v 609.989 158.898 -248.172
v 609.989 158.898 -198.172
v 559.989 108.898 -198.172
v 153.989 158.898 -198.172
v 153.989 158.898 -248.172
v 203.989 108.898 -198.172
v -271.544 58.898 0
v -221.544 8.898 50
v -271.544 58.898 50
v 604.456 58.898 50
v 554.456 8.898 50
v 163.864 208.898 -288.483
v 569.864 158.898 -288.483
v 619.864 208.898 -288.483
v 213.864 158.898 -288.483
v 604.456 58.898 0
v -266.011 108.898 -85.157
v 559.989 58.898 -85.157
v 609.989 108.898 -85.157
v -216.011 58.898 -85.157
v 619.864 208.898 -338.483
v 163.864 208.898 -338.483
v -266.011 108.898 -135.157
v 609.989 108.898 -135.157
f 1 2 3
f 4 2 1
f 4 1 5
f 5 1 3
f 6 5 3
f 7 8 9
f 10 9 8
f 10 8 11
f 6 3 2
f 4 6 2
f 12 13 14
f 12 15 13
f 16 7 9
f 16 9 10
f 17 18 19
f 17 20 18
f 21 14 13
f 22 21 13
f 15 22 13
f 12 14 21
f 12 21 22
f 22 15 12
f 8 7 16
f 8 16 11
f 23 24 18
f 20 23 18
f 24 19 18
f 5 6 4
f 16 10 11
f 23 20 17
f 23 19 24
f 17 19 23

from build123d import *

# Parameters (mm, degrees)
F0_W      = 876
F0_H      = 50
F1_DEPTH  = 50
F3_DEPTH  = 876.001
F4_W      = 876
F4_H      = 50
F5_DEPTH  = 50
F7_DEPTH  = 876
F8_W      = 456
F8_H      = 50
F9_DEPTH  = 50
F11_DEPTH = 876
F12_W     = 456
F12_H     = 50
F13_DEPTH = 50
F15_DEPTH = 456
F17_DEPTH = 388.483529
F19_DEPTH = 253.326912
F21_DEPTH = 140.311034
F23_DEPTH = 50


with BuildPart() as f1:
    # F0 (on Top) → F1 (new body)
    with BuildSketch(Plane.XY):
        with Locations((166.456298, 33.898029)):
            Rectangle(F0_W, F0_H)
    extrude(amount=F1_DEPTH)

    # F2 (on face) → F3 (cut, through all)
    with BuildSketch(Plane.YZ.offset(604.456298)):
        Polygon((58.898029, 0), (8.898029, 50), (8.898029, 0), align=None)
    extrude(amount=-F3_DEPTH, mode=Mode.SUBTRACT)

    # F16 (on face) → F17 (cut, through all)
    with BuildSketch(Plane.XY.offset(50)):
        Polygon((-221.543702, 8.898029), (-271.543702, 58.898029), (-271.543702, 8.898029), align=None)
        Polygon((604.456298, 8.898029), (604.456298, 58.898029), (554.456298, 8.898029), align=None)
    extrude(amount=-F17_DEPTH, mode=Mode.SUBTRACT)


with BuildPart() as f5:
    # F4 (on face) → F5 (new body)
    with BuildSketch(Plane(origin=(0, 58.898029, 0), x_dir=(-1, 0, 0), z_dir=(0, 1, 0))):
        with Locations((-171.989239, -110.156617)):
            Rectangle(F4_W, F4_H)
    extrude(amount=F5_DEPTH)

    # F6 (on face) → F7 (cut)
    with BuildSketch(Plane.YZ.offset(609.989239)):
        Polygon((108.898029, -135.156617), (58.898029, -85.156617), (58.898029, -135.156617), align=None)
    extrude(amount=-F7_DEPTH, mode=Mode.SUBTRACT)

    # F18 (on face) → F19 (cut, through all)
    with BuildSketch(Plane.XY.offset(-85.156617)):
        Polygon((-216.010761, 58.898029), (-266.010761, 108.898029), (-266.010761, 58.898029), align=None)
        Polygon((609.989239, 58.898029), (609.989239, 108.898029), (559.989239, 58.898029), align=None)
    extrude(amount=-F19_DEPTH, mode=Mode.SUBTRACT)


with BuildPart() as f9:
    # F8 (on face) → F9 (new body)
    with BuildSketch(Plane(origin=(0, 108.898029, 0), x_dir=(-1, 0, 0), z_dir=(0, 1, 0))):
        with Locations((-381.989239, -223.172495)):
            Rectangle(F8_W, F8_H)
    extrude(amount=F9_DEPTH)

    # F10 (on face) → F11 (cut)
    with BuildSketch(Plane.YZ.offset(609.989239)):
        Polygon((158.898029, -248.172495), (108.898029, -198.172495), (108.898029, -248.172495), align=None)
    extrude(amount=-F11_DEPTH, mode=Mode.SUBTRACT)

    # F20 (on face) → F21 (cut, through all)
    with BuildSketch(Plane.XY.offset(-198.172495)):
        Polygon((203.989239, 108.898029), (153.989239, 158.898029), (153.989239, 108.898029), align=None)
        Polygon((609.989239, 108.898029), (609.989239, 158.898029), (559.989239, 108.898029), align=None)
    extrude(amount=-F21_DEPTH, mode=Mode.SUBTRACT)


with BuildPart() as f13:
    # F12 (on face) → F13 (new body)
    with BuildSketch(Plane(origin=(0, 158.898029, 0), x_dir=(-1, 0, 0), z_dir=(0, 1, 0))):
        with Locations((-391.864389, -313.482529)):
            Rectangle(F12_W, F12_H)
    extrude(amount=F13_DEPTH)

    # F14 (on face) → F15 (cut)
    with BuildSketch(Plane.YZ.offset(619.864389)):
        Polygon((208.898029, -338.482529), (158.898029, -288.482529), (158.898029, -338.482529), align=None)
    extrude(amount=-F15_DEPTH, mode=Mode.SUBTRACT)

    # F22 (on face) → F23 (cut)
    with BuildSketch(Plane.XY.offset(-288.482529)):
        Polygon((213.864389, 158.898029), (163.864389, 208.898029), (163.864389, 158.898029), align=None)
        Polygon((619.864389, 158.898029), (619.864389, 208.898029), (569.864389, 158.898029), align=None)
    extrude(amount=-F23_DEPTH, mode=Mode.SUBTRACT)


solid = Compound([f1.part, f5.part, f9.part, f13.part])
